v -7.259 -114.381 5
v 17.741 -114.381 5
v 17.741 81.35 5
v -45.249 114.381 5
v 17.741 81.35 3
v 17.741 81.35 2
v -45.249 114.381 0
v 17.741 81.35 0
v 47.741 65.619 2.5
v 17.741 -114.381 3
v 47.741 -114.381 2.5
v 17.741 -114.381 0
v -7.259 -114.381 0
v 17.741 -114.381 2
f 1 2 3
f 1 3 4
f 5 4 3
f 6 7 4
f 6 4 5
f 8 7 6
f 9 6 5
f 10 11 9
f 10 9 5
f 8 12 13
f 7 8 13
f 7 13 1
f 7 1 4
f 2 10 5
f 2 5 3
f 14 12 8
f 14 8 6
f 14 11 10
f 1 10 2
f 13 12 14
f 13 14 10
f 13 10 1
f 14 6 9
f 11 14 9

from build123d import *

# Parameters (mm, degrees)
EXTRUDE_1_DEPTH     = 5
CUT_EXTRUDE_2_DEPTH = 200


with BuildPart() as part:
    # 草图1 → 凸台-拉伸1 (new body)
    with BuildSketch(Plane.XY):
        Polygon((-7.259084377, -114.381441925), (-45.249305145, 114.381441925), (47.740915623, 65.618558075), (47.740915623, -114.381441925), align=None)
    extrude(amount=EXTRUDE_1_DEPTH)

    # 草图2 → 切除-拉伸2 (cut)
    with BuildSketch(Plane.XZ.offset(114.381441925)):
        Polygon((17.740915623, 5), (47.740915623, 5.362068385), (52.130743892, 0.972240116), (47.740915623, -0.81389846), (17.740915623, 0), (17.740915623, 1.999597824), (47.740915623, 2.5), (17.740915623, 3.000402176), align=None)
        Polygon((47.740915623, 35.362068385), (52.130743892, 30.972240116), (47.740915623, 29.18610154), (17.740915623, 30), (17.740915623, 31.999597824), (47.740915623, 32.5), (17.740915623, 33.000402176), (17.740915623, 35), align=None)
    extrude(amount=-CUT_EXTRUDE_2_DEPTH, mode=Mode.SUBTRACT)


solid = part.part
